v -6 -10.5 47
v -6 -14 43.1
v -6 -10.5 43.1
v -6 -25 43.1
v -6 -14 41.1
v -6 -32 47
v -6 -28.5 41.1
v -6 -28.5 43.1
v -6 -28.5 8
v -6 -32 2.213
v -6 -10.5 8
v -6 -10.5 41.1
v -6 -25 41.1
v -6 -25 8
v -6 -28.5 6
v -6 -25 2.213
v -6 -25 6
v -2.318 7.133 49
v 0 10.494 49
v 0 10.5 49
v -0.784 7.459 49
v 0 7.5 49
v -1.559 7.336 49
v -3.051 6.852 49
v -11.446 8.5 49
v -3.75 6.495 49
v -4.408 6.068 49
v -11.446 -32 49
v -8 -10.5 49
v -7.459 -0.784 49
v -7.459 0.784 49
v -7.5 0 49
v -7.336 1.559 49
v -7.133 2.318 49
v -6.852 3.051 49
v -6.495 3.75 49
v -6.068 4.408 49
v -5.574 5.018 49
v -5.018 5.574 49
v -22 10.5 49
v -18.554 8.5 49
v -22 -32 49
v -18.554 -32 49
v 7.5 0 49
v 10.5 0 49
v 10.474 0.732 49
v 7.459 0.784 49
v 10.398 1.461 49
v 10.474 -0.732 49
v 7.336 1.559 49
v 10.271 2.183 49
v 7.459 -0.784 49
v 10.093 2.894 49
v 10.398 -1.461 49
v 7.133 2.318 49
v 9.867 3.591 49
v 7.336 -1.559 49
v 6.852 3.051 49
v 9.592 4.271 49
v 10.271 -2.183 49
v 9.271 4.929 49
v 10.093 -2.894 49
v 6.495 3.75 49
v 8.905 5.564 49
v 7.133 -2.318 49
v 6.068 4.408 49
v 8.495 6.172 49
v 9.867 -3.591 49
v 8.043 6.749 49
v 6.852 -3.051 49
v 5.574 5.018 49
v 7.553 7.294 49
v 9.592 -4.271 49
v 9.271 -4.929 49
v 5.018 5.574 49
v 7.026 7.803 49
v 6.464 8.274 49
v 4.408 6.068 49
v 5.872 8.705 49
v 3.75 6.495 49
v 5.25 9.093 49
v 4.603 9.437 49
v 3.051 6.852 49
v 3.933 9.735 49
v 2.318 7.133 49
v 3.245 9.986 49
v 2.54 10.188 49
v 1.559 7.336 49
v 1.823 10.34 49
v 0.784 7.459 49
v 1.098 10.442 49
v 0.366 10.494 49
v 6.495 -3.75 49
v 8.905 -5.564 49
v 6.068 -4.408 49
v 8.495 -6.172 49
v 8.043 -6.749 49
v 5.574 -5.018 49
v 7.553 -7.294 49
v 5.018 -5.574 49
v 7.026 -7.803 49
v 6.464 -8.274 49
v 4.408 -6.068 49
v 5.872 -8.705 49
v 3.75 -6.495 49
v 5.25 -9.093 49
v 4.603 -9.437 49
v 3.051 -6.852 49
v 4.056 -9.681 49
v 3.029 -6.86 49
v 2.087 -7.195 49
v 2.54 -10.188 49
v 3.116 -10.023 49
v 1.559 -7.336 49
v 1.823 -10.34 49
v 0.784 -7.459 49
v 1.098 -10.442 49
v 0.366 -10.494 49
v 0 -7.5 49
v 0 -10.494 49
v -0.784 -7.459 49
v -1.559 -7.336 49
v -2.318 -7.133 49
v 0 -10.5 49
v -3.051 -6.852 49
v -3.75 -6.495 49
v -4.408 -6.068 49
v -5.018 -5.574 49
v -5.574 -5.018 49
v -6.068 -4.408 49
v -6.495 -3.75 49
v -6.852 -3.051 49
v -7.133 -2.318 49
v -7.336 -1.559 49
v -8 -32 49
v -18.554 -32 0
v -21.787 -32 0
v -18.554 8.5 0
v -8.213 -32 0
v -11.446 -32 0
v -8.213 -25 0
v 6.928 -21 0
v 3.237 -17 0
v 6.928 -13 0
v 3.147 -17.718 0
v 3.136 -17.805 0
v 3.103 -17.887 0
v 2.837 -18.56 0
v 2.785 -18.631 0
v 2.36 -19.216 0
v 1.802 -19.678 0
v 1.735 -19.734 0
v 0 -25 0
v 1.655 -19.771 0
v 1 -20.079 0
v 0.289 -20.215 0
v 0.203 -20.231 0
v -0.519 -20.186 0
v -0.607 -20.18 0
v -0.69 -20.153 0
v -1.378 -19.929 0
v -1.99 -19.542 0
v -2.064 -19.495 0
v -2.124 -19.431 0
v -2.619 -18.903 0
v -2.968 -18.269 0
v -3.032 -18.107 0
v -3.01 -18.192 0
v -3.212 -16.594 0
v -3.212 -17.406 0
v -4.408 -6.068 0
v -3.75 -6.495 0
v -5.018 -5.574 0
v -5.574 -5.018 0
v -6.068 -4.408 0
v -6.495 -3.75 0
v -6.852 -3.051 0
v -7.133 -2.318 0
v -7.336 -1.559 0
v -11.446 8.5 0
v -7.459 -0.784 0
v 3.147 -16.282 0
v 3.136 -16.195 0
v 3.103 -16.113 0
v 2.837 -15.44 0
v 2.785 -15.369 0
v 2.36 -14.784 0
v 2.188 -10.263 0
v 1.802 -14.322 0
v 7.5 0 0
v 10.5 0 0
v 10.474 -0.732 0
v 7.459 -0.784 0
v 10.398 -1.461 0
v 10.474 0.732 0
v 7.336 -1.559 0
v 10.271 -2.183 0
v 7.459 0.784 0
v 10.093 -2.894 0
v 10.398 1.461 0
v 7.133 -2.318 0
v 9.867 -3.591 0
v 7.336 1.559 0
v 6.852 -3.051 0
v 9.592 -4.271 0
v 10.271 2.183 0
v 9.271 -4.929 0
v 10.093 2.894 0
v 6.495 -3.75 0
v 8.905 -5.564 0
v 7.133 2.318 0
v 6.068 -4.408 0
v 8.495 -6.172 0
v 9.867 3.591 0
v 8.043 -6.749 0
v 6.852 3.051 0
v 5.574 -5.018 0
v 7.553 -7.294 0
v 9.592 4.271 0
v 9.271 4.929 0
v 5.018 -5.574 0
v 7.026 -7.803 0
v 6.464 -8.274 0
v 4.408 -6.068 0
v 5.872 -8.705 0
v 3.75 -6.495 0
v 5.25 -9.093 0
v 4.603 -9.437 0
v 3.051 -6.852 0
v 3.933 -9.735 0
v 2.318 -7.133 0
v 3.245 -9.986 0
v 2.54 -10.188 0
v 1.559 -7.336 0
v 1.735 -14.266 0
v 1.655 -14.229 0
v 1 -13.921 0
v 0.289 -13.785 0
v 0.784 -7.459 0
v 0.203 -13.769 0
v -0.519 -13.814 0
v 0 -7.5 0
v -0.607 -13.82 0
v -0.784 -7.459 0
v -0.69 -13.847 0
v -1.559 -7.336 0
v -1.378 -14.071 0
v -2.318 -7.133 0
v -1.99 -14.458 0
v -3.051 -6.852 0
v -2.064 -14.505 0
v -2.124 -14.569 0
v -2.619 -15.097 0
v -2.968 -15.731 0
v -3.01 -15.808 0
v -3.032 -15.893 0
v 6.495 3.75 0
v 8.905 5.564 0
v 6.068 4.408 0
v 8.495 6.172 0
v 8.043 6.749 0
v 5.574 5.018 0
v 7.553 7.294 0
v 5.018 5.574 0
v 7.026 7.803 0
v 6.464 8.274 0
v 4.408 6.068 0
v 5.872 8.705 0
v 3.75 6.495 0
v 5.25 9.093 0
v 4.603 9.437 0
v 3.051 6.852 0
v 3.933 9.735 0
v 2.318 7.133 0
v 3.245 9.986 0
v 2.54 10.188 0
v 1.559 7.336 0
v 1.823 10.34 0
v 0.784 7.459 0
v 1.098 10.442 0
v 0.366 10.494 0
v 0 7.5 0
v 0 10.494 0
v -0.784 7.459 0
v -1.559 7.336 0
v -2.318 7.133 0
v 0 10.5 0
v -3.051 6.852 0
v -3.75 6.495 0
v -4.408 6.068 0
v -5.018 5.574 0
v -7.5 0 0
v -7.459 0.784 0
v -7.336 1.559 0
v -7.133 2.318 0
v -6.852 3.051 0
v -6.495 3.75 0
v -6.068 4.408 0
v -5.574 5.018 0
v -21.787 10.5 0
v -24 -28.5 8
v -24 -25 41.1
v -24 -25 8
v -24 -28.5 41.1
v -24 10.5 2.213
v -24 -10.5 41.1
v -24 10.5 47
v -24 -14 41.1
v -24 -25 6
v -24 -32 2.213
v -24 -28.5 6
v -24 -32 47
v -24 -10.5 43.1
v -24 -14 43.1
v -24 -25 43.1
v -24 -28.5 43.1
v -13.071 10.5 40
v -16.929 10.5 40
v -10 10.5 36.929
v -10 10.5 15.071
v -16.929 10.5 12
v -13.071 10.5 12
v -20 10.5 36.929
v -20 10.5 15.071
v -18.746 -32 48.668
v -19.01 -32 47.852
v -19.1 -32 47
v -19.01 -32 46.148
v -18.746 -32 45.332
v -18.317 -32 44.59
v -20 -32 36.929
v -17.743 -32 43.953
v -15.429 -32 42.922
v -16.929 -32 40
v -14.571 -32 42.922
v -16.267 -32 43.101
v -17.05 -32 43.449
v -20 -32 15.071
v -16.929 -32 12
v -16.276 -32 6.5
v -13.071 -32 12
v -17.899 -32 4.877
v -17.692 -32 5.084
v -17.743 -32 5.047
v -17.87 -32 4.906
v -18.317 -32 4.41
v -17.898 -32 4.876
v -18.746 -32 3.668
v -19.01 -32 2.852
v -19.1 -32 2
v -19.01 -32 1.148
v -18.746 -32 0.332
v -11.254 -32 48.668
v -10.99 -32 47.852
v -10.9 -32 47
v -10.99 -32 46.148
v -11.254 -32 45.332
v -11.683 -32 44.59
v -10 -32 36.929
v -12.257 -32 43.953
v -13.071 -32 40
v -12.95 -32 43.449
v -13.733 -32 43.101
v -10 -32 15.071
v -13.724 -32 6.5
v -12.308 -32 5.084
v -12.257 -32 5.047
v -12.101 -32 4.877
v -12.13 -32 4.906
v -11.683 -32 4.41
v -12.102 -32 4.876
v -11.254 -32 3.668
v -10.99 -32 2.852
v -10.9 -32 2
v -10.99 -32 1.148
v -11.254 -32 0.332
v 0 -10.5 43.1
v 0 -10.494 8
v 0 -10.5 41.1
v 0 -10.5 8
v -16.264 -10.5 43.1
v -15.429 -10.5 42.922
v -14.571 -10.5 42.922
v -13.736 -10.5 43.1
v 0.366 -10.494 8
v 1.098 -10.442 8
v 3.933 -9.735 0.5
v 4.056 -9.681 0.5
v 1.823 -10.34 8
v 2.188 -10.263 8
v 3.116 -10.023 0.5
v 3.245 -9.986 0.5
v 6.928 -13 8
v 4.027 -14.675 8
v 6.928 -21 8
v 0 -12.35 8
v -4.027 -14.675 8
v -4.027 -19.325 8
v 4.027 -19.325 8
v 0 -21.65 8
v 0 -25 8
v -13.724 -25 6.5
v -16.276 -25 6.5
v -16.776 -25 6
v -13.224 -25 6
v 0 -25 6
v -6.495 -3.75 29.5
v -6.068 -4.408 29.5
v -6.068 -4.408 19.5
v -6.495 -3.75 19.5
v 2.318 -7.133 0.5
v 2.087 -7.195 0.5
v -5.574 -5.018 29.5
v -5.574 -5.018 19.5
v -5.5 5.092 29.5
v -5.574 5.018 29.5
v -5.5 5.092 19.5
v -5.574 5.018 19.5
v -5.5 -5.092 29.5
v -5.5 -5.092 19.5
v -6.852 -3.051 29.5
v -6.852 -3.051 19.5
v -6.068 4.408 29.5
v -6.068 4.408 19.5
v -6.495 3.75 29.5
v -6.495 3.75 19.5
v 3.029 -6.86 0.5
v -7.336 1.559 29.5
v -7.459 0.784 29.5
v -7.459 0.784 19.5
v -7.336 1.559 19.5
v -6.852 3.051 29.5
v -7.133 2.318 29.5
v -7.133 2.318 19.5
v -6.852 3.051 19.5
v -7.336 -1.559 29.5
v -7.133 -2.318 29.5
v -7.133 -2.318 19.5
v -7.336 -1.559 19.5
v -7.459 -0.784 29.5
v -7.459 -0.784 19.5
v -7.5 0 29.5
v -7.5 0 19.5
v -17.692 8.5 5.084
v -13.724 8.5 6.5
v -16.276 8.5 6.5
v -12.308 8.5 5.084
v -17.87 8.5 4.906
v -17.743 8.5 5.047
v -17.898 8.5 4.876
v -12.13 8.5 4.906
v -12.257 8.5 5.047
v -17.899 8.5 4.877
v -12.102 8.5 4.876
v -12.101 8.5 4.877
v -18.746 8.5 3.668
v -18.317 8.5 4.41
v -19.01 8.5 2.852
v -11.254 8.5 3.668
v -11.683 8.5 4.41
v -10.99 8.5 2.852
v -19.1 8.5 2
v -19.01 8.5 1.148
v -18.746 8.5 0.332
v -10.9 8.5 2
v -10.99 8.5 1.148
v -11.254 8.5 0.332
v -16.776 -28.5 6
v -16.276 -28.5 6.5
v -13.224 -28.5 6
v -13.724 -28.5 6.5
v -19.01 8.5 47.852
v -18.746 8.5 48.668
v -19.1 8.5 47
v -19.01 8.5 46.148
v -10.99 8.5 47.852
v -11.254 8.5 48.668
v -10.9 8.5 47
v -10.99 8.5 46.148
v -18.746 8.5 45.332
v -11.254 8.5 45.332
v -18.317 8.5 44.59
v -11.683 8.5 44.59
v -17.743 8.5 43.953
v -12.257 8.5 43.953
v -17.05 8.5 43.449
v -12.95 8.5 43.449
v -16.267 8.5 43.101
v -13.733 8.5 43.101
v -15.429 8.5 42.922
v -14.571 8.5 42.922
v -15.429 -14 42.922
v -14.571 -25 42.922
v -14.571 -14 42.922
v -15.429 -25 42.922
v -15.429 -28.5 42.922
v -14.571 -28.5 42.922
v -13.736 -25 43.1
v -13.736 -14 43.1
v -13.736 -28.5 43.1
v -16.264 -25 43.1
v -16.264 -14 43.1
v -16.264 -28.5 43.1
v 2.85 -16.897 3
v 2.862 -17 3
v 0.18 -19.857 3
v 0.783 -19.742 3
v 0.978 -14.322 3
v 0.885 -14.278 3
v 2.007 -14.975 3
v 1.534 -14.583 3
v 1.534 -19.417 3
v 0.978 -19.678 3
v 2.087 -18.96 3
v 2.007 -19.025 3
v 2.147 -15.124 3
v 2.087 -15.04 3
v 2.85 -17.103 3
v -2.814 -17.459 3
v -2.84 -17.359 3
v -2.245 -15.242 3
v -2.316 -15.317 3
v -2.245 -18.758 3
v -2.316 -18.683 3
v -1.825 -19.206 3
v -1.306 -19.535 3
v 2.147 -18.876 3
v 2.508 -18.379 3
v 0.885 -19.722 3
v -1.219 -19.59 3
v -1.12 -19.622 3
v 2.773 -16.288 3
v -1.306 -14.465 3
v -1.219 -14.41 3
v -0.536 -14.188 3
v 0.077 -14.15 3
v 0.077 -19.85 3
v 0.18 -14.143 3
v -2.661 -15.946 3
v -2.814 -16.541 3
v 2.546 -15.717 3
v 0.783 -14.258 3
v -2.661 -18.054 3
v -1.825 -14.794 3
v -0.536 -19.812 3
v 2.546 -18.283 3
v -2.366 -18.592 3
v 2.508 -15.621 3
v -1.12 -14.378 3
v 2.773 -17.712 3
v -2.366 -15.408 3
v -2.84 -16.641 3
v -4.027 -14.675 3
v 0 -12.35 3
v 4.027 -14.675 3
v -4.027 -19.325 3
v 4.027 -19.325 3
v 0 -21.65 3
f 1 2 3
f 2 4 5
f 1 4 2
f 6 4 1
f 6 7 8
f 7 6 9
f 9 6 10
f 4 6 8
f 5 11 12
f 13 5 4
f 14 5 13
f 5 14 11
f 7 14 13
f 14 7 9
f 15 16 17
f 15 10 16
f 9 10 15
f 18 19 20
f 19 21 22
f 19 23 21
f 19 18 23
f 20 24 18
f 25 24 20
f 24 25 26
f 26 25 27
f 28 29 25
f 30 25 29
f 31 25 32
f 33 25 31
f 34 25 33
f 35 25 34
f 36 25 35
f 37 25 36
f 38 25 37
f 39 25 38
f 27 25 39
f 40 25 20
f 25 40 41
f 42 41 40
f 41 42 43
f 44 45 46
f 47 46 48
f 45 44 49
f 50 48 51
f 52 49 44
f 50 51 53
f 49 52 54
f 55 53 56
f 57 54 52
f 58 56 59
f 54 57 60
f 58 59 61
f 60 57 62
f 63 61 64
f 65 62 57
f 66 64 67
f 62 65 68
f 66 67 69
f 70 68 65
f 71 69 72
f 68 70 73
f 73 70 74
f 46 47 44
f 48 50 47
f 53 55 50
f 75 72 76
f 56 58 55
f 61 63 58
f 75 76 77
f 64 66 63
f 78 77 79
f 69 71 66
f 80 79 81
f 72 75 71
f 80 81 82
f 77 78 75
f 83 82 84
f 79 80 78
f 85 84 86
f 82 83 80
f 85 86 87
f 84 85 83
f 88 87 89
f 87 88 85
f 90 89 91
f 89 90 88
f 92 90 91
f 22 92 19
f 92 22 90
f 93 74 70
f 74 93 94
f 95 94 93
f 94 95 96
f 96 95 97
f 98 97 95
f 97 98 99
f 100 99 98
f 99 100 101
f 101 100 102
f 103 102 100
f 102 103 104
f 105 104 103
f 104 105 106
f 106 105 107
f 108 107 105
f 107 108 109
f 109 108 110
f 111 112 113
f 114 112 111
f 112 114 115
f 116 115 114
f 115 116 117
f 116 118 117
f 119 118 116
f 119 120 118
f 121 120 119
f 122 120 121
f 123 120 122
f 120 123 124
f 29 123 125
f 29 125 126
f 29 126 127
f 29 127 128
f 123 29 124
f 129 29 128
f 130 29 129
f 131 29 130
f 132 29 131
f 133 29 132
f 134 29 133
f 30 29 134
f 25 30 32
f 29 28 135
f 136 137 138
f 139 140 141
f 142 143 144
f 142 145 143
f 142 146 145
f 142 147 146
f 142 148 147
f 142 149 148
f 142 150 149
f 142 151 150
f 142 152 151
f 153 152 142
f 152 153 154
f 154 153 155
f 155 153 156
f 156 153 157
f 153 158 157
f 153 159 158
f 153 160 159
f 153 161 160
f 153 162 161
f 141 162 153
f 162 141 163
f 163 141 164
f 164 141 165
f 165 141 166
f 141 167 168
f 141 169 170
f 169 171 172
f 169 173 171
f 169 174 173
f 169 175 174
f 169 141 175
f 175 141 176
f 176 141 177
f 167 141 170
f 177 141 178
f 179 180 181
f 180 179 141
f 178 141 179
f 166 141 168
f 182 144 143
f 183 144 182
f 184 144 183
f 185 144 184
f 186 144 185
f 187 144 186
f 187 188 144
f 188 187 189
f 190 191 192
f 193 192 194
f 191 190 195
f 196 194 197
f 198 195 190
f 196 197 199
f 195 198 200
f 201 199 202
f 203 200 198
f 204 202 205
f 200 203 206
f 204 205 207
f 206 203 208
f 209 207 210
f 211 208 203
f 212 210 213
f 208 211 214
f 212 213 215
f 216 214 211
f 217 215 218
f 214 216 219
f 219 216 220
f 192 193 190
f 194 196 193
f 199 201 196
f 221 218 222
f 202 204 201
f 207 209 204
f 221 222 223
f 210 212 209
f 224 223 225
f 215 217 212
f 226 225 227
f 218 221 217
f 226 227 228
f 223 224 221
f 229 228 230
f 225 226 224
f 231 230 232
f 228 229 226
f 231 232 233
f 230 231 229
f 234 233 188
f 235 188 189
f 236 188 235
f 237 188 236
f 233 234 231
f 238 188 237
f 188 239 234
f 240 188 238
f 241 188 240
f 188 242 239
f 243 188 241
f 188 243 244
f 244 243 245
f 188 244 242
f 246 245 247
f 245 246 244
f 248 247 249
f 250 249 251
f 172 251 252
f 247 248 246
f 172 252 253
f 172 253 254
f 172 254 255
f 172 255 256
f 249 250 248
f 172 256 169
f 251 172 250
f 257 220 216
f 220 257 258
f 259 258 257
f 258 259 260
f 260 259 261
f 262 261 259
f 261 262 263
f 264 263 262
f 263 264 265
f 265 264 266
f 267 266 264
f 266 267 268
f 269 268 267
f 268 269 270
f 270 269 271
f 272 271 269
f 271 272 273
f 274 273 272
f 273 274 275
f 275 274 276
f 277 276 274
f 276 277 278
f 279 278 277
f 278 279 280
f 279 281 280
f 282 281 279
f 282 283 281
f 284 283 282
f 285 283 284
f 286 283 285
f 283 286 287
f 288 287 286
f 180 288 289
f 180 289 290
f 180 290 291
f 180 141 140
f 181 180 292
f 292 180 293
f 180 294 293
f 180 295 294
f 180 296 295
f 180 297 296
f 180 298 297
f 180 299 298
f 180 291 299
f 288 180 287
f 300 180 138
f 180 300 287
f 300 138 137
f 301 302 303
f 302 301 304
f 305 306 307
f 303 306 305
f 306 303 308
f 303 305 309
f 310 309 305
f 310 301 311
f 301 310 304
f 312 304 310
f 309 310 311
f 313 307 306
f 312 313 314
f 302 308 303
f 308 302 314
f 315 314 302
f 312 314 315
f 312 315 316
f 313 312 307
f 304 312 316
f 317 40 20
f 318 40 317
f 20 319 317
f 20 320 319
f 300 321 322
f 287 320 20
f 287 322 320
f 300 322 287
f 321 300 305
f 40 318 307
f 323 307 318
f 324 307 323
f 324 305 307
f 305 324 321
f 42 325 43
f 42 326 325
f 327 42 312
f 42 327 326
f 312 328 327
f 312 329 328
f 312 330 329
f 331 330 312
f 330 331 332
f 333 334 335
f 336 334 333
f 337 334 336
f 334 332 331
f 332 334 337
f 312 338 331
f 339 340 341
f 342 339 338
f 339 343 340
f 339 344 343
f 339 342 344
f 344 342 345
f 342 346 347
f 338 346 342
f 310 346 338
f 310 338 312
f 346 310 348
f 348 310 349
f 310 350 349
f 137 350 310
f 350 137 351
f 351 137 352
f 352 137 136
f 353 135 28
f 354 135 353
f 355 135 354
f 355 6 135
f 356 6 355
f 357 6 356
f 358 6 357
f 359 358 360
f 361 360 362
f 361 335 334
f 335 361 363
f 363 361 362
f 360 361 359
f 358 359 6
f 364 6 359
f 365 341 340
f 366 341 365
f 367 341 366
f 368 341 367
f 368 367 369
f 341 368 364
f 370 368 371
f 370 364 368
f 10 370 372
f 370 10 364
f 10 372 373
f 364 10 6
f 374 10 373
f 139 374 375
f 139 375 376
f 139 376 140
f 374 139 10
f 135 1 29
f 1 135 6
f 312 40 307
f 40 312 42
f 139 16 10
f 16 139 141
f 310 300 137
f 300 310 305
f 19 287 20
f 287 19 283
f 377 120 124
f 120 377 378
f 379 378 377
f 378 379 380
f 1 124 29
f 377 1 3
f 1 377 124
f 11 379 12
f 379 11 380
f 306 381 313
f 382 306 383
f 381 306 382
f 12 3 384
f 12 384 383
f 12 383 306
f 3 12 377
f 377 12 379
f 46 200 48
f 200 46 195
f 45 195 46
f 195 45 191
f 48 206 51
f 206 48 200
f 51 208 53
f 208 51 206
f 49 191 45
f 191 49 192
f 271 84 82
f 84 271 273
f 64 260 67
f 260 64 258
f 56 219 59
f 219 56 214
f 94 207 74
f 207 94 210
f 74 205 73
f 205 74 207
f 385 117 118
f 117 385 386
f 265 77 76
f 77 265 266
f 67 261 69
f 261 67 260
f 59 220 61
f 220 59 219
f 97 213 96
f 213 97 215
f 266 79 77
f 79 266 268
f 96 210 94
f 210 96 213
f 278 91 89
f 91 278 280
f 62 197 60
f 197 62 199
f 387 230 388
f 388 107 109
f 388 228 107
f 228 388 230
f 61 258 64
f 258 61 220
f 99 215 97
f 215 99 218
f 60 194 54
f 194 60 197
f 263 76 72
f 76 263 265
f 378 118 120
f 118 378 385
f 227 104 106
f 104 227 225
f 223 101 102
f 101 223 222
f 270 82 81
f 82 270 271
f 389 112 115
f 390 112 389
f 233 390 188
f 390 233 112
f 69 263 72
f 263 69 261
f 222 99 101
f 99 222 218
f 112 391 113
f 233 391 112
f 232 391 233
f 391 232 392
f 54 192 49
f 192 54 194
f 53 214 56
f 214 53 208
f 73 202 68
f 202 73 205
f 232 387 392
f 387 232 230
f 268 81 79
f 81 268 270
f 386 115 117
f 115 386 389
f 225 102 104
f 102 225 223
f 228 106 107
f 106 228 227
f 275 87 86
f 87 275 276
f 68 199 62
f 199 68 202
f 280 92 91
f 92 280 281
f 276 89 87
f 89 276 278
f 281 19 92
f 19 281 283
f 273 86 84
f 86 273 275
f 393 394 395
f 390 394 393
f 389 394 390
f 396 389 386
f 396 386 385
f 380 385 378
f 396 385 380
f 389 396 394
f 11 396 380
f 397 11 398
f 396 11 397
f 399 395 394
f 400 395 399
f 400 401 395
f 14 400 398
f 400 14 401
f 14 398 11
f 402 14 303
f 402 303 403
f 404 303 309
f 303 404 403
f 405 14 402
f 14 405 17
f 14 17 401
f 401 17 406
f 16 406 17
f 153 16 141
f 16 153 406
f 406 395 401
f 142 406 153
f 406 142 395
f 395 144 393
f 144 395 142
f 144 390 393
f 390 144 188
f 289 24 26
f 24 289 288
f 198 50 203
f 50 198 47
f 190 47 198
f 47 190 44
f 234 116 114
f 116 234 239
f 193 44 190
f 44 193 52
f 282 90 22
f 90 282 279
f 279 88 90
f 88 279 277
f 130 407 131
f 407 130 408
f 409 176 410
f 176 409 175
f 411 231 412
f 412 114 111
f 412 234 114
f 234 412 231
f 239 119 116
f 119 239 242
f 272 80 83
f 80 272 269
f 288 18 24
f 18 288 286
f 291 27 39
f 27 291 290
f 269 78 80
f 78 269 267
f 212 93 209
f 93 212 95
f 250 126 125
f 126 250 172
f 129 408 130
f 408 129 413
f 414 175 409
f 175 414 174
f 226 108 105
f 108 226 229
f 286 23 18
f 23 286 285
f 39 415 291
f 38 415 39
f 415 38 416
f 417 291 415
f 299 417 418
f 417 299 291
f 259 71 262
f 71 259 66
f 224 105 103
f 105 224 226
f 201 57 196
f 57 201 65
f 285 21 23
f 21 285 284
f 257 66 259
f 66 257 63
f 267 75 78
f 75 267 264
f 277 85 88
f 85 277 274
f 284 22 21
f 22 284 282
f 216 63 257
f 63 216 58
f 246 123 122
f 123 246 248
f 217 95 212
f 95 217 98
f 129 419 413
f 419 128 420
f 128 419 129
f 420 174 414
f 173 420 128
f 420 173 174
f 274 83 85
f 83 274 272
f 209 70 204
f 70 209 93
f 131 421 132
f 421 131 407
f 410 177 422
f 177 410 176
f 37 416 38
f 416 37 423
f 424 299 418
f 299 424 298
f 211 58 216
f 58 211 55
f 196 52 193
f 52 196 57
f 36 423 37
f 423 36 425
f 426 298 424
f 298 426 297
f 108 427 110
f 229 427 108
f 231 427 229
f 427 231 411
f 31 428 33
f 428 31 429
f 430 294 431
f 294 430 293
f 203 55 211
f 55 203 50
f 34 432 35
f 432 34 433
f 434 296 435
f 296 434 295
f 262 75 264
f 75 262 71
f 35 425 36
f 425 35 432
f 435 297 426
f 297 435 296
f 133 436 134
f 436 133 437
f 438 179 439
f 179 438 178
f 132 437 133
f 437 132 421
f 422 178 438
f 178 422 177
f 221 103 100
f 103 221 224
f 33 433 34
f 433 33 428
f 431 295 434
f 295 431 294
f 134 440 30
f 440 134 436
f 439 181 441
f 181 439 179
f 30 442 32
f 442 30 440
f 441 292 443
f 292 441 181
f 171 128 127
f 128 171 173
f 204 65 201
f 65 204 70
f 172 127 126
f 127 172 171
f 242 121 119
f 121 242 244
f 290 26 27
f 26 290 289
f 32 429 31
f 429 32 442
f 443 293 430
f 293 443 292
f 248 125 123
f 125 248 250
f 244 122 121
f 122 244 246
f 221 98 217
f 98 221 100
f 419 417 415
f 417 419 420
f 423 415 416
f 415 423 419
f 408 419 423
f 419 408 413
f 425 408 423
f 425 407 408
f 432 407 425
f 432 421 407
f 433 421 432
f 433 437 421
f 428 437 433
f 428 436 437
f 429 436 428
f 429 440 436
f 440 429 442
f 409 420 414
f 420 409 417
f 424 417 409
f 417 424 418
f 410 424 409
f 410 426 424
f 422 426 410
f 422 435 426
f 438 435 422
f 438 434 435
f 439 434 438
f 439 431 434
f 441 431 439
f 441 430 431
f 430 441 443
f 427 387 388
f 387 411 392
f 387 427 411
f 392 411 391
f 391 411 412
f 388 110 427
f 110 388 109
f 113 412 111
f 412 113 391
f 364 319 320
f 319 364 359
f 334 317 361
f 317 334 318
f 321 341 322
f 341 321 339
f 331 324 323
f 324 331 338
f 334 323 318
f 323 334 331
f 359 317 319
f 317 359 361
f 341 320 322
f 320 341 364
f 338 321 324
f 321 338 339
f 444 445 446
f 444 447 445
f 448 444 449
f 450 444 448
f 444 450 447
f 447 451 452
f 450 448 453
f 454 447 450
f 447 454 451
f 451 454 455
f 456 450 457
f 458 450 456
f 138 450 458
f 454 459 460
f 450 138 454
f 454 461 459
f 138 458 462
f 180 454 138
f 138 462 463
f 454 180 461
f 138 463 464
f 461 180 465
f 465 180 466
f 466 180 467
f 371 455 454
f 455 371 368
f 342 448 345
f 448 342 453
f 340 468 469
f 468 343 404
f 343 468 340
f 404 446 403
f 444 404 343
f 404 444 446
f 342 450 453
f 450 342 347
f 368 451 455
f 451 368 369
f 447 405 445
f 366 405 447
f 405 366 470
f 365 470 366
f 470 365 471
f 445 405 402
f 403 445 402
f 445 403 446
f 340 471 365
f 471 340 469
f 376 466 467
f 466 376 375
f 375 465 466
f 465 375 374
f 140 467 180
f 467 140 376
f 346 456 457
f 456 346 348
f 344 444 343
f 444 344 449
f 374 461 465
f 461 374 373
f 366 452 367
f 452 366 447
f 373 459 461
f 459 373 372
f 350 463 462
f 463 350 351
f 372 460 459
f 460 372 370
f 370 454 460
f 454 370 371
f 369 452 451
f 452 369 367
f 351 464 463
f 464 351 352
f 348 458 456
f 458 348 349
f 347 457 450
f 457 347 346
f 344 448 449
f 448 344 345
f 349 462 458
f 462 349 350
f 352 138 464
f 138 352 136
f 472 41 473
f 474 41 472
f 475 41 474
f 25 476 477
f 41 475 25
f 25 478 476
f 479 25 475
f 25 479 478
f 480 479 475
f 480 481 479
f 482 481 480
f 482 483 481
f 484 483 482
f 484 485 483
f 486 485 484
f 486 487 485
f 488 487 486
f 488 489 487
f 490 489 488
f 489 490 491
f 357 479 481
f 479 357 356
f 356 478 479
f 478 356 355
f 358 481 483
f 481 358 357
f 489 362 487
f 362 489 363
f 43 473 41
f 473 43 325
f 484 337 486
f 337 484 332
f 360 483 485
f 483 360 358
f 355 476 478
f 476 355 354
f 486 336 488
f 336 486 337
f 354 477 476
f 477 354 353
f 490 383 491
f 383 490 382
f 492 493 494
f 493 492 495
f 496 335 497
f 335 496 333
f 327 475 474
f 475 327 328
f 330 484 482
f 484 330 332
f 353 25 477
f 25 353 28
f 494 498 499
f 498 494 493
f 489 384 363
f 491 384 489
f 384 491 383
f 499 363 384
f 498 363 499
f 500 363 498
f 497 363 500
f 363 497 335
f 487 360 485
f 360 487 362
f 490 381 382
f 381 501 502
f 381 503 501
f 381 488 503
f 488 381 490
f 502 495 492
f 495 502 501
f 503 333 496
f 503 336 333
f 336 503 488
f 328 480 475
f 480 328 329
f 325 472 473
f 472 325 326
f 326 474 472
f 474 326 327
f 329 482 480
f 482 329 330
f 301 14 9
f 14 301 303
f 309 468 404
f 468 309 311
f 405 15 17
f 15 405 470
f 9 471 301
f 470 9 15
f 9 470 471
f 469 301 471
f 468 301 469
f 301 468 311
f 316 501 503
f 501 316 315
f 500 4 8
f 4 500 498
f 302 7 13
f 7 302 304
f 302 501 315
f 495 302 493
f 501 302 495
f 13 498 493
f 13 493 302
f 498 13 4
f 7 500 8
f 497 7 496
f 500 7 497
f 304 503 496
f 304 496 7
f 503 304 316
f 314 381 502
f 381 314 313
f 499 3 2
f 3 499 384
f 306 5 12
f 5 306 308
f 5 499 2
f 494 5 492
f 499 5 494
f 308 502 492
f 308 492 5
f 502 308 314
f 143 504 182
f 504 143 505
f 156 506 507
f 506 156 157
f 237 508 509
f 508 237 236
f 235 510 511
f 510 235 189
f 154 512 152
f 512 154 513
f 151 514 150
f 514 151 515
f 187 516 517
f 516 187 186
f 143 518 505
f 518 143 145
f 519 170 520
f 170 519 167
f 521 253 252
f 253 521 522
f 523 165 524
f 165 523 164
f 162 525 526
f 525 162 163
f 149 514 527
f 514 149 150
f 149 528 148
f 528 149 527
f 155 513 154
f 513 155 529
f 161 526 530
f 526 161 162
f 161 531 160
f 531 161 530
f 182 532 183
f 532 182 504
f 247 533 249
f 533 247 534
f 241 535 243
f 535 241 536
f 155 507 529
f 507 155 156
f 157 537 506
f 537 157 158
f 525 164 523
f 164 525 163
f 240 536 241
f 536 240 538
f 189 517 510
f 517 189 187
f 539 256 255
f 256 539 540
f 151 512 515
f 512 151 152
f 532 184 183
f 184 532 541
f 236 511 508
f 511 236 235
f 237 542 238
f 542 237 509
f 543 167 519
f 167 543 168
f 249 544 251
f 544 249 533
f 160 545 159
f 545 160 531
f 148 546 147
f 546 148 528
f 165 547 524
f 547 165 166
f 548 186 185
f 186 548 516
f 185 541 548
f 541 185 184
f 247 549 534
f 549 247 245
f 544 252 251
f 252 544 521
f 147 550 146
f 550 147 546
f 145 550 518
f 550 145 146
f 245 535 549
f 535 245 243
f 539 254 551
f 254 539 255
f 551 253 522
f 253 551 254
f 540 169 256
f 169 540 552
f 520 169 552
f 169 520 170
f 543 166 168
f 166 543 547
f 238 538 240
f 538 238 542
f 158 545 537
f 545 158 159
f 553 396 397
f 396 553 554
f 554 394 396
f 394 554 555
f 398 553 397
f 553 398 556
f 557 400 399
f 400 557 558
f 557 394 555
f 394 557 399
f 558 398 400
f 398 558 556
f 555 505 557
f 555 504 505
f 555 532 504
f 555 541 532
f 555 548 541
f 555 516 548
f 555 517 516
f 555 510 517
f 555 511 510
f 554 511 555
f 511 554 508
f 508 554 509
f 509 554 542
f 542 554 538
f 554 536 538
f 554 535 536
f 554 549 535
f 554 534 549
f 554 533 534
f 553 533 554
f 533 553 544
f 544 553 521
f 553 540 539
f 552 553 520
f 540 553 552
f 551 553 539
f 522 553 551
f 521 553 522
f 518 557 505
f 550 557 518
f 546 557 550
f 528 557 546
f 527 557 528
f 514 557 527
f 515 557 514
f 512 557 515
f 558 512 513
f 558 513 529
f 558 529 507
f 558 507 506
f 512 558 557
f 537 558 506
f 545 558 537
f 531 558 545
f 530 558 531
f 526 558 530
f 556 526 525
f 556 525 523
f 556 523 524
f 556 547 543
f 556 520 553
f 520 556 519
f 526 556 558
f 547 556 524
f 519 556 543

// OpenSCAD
// file: bearing.scad
// PRUSA iteration3
// Bearing holders
// GNU GPL v3
// Josef Průša <iam@josefprusa.cz> and contributors
// http://www.reprap.org/wiki/Prusa_Mendel
// http://prusamendel.org

bearing_diameter = 15;

module horizontal_bearing_base(bearings=1) {
  translate(v=[0,0,6]) cube(size = [24,8+bearings*25,12], center = true);
}

module horizontal_bearing_holes(bearings=1) {
  cutter_lenght = 10+bearings*25;
  one_holder_lenght = 8+25;
  holder_lenght = 8+bearings*25;

  // Main bearing cut
  difference() {
    translate(v = [0,0,12]) rotate(a = [90,0,0]) translate(v = [0,0,-cutter_lenght/2]) cylinder(h = cutter_lenght, r = bearing_diameter/2, $fn = 50);
    // Bearing retainers
    translate(v=[0,1-holder_lenght/2,3]) cube(size = [24,6,8], center = true);
    translate(v=[0,-1+holder_lenght/2,3]) cube(size = [24,6,8], center = true);
  }

  // Ziptie cutouts
  ziptie_cut_ofset = 0;

  for (i = [0:bearings-1]) {
    // For easier positioning I move them by half of one
    // bearing holder then add each bearign lenght and then center again
    translate(v = [0,-holder_lenght/2,0]) translate(v = [0,one_holder_lenght/2+i*25,0]) difference(){
      union(){
        translate(v = [0,2-6,12]) rotate(a = [90,0,0]) translate(v = [0,0,0]) cylinder(h = 4, r = 12.5, $fn = 50);
        translate(v = [0,2+6,12]) rotate(a = [90,0,0]) translate(v = [0,0,0]) cylinder(h = 4, r = 12.5, $fn = 50);
      }
      translate(v = [0,10,12]) rotate(a = [90,0,0]) translate(v = [0,0,0]) cylinder(h = 24, r = 10, $fn = 50);
    }
  }
}

module horizontal_bearing_test() {
  difference(){
    horizontal_bearing_base(1);
    horizontal_bearing_holes(1);
  }
  translate(v=[30,0,0]) difference(){
    horizontal_bearing_base(2);
    horizontal_bearing_holes(2);
  }
  translate(v=[60,0,0]) difference(){
    horizontal_bearing_base(3);
    horizontal_bearing_holes(3);
  }
}

thinwall = 3;
bearing_size = bearing_diameter + 2 * thinwall;

module vertical_bearing_base(height) {
  translate(v = [-2-bearing_size/4,0,height/2]) cube(size = [4+bearing_size/2,bearing_size,height], center = true);
  cylinder(h = height, r=bearing_size/2, $fn = 90);
}

module vertical_bearing_holes(height) {
  difference() {
    translate(v = [0,0,-1]) cylinder(h = height+2, r = bearing_diameter/2, $fn = 60);
    translate(v = [-bearing_diameter/2,0,height/2]) cube([4,bearing_diameter+2,10], center = true);
  }
  rotate(a = [0,0,-70]) translate(v = [8,0,31.5]) cube(size = [5,1,62], center = true);
}

difference() {
  vertical_bearing_base(58);
  vertical_bearing_holes(58);
}
// main file
// PRUSA iteration3
// X end prototype
// GNU GPL v3
// Josef Průša <iam@josefprusa.cz> and contributors
// http://www.reprap.org/wiki/Prusa_Mendel
// http://prusamendel.org

use <bearing.scad>
rod_distance = 45;
m5_tolerance = 0.3;

module x_end_base() {
  // Main block
  height = 49;

  difference() {
    translate(v = [-15,-9-3.5/2,height/2]) cube(size = [18,39+3.5,height], center = true);
    // Top corners cutouts
    translate([-15+7,-20,51-2]) rotate([0,45,0]) translate([-15,-15,0]) cube([30,60,30]);
    translate([-15-18+11,-20,51-2]) rotate([0,-45,0]) translate([-15,-15,0]) cube([30,60,30]);
    // Bottom corners cutout
    translate([-15+7,-20,-19-2]) rotate([0,45,0]) translate([-15,-15,0]) cube([30,60,30]);
    translate([-15-18+11,-20,-19-2]) rotate([0,-45,0]) translate([-15,-15,0]) cube([30,60,30]);
  }

  // Bearing holder
  vertical_bearing_base(49);

  // Nut trap
  // Cube
  translate(v = [-2-2-1,-17,4]) cube(size = [8+2,16,8], center = true);
  // Hexagon
  translate(v = [0,-17,0]) rotate([0,0,30]) cylinder(h = 8, r = 8, $fn = 6);
}

module x_end_holes() {
  vertical_bearing_holes(49);

  // Belt hole
  translate(v = [-1,0,-4])

  difference() {
    translate(v = [-5.5-10+1.5,-10,30]) cube(size = [10,46,28], center = true);

  	// Nice edges
  	translate(v = [-5.5-10+1.5,-10,30+23]) rotate([0,45,0]) cube(size = [10,46,28], center = true);
  	translate(v = [-5.5-10+1.5,-10,30+23]) rotate([0,-45,0]) cube(size = [10,46,28], center = true);
  	translate(v = [-5.5-10+1.5,-10,30-23]) rotate([0,45,0]) cube(size = [10,46,28], center = true);
  	translate(v = [-5.5-10+1.5,-10,30-23]) rotate([0,-45,0]) cube(size = [10,46,28], center = true);
}

  // Bottom pushfit rod
  translate(v = [-15,-41.5,2]) rotate(a = [-90,0,0]) pushfit_rod(8.2,50);

  // Top pushfit rod
  translate(v = [-15,-41.5,rod_distance+2]) rotate(a = [-90,0,0]) pushfit_rod(8.2,50);

  // Ziptie
  translate([-30,-28.5,6]) cube([30,3.5,2]);
  translate([-30,-28.5,49-6-1.9]) cube([30,3.5,2]);
  translate([-30,-14,49-6-1.9]) cube([30,3.5,2]);

  // Nut trap
  translate(v = [0,-17,-0.5]) cylinder(h = 4, r1 = 3.3, r2 = 2.8, $fn = 25);
  translate(v = [0,-17,3]) rotate([0,0,30]) cylinder(h = 10, r=4.5+m5_tolerance/2, $fn = 6);
}

// Final prototype
module x_end_plain() {
  difference() {
    x_end_base();
    x_end_holes();
  }
}

x_end_plain();

module pushfit_rod(diameter,length) {
  cylinder(h = length, r = diameter/2, $fn = 30);
  difference() {
 	  translate(v = [0,-diameter/2.85,length/2]) rotate([0,0,45]) cube(size = [diameter/2,diameter/2,length], center = true);
 	  translate(v = [0,-diameter/4-diameter/2-0.4,length/2]) rotate([0,0,0]) cube(size = [diameter,diameter/2,length], center = true);
  }
  //translate(v=[0,-diameter/2-2,length/2]) cube(size = [diameter,1,length], center = true);
}
